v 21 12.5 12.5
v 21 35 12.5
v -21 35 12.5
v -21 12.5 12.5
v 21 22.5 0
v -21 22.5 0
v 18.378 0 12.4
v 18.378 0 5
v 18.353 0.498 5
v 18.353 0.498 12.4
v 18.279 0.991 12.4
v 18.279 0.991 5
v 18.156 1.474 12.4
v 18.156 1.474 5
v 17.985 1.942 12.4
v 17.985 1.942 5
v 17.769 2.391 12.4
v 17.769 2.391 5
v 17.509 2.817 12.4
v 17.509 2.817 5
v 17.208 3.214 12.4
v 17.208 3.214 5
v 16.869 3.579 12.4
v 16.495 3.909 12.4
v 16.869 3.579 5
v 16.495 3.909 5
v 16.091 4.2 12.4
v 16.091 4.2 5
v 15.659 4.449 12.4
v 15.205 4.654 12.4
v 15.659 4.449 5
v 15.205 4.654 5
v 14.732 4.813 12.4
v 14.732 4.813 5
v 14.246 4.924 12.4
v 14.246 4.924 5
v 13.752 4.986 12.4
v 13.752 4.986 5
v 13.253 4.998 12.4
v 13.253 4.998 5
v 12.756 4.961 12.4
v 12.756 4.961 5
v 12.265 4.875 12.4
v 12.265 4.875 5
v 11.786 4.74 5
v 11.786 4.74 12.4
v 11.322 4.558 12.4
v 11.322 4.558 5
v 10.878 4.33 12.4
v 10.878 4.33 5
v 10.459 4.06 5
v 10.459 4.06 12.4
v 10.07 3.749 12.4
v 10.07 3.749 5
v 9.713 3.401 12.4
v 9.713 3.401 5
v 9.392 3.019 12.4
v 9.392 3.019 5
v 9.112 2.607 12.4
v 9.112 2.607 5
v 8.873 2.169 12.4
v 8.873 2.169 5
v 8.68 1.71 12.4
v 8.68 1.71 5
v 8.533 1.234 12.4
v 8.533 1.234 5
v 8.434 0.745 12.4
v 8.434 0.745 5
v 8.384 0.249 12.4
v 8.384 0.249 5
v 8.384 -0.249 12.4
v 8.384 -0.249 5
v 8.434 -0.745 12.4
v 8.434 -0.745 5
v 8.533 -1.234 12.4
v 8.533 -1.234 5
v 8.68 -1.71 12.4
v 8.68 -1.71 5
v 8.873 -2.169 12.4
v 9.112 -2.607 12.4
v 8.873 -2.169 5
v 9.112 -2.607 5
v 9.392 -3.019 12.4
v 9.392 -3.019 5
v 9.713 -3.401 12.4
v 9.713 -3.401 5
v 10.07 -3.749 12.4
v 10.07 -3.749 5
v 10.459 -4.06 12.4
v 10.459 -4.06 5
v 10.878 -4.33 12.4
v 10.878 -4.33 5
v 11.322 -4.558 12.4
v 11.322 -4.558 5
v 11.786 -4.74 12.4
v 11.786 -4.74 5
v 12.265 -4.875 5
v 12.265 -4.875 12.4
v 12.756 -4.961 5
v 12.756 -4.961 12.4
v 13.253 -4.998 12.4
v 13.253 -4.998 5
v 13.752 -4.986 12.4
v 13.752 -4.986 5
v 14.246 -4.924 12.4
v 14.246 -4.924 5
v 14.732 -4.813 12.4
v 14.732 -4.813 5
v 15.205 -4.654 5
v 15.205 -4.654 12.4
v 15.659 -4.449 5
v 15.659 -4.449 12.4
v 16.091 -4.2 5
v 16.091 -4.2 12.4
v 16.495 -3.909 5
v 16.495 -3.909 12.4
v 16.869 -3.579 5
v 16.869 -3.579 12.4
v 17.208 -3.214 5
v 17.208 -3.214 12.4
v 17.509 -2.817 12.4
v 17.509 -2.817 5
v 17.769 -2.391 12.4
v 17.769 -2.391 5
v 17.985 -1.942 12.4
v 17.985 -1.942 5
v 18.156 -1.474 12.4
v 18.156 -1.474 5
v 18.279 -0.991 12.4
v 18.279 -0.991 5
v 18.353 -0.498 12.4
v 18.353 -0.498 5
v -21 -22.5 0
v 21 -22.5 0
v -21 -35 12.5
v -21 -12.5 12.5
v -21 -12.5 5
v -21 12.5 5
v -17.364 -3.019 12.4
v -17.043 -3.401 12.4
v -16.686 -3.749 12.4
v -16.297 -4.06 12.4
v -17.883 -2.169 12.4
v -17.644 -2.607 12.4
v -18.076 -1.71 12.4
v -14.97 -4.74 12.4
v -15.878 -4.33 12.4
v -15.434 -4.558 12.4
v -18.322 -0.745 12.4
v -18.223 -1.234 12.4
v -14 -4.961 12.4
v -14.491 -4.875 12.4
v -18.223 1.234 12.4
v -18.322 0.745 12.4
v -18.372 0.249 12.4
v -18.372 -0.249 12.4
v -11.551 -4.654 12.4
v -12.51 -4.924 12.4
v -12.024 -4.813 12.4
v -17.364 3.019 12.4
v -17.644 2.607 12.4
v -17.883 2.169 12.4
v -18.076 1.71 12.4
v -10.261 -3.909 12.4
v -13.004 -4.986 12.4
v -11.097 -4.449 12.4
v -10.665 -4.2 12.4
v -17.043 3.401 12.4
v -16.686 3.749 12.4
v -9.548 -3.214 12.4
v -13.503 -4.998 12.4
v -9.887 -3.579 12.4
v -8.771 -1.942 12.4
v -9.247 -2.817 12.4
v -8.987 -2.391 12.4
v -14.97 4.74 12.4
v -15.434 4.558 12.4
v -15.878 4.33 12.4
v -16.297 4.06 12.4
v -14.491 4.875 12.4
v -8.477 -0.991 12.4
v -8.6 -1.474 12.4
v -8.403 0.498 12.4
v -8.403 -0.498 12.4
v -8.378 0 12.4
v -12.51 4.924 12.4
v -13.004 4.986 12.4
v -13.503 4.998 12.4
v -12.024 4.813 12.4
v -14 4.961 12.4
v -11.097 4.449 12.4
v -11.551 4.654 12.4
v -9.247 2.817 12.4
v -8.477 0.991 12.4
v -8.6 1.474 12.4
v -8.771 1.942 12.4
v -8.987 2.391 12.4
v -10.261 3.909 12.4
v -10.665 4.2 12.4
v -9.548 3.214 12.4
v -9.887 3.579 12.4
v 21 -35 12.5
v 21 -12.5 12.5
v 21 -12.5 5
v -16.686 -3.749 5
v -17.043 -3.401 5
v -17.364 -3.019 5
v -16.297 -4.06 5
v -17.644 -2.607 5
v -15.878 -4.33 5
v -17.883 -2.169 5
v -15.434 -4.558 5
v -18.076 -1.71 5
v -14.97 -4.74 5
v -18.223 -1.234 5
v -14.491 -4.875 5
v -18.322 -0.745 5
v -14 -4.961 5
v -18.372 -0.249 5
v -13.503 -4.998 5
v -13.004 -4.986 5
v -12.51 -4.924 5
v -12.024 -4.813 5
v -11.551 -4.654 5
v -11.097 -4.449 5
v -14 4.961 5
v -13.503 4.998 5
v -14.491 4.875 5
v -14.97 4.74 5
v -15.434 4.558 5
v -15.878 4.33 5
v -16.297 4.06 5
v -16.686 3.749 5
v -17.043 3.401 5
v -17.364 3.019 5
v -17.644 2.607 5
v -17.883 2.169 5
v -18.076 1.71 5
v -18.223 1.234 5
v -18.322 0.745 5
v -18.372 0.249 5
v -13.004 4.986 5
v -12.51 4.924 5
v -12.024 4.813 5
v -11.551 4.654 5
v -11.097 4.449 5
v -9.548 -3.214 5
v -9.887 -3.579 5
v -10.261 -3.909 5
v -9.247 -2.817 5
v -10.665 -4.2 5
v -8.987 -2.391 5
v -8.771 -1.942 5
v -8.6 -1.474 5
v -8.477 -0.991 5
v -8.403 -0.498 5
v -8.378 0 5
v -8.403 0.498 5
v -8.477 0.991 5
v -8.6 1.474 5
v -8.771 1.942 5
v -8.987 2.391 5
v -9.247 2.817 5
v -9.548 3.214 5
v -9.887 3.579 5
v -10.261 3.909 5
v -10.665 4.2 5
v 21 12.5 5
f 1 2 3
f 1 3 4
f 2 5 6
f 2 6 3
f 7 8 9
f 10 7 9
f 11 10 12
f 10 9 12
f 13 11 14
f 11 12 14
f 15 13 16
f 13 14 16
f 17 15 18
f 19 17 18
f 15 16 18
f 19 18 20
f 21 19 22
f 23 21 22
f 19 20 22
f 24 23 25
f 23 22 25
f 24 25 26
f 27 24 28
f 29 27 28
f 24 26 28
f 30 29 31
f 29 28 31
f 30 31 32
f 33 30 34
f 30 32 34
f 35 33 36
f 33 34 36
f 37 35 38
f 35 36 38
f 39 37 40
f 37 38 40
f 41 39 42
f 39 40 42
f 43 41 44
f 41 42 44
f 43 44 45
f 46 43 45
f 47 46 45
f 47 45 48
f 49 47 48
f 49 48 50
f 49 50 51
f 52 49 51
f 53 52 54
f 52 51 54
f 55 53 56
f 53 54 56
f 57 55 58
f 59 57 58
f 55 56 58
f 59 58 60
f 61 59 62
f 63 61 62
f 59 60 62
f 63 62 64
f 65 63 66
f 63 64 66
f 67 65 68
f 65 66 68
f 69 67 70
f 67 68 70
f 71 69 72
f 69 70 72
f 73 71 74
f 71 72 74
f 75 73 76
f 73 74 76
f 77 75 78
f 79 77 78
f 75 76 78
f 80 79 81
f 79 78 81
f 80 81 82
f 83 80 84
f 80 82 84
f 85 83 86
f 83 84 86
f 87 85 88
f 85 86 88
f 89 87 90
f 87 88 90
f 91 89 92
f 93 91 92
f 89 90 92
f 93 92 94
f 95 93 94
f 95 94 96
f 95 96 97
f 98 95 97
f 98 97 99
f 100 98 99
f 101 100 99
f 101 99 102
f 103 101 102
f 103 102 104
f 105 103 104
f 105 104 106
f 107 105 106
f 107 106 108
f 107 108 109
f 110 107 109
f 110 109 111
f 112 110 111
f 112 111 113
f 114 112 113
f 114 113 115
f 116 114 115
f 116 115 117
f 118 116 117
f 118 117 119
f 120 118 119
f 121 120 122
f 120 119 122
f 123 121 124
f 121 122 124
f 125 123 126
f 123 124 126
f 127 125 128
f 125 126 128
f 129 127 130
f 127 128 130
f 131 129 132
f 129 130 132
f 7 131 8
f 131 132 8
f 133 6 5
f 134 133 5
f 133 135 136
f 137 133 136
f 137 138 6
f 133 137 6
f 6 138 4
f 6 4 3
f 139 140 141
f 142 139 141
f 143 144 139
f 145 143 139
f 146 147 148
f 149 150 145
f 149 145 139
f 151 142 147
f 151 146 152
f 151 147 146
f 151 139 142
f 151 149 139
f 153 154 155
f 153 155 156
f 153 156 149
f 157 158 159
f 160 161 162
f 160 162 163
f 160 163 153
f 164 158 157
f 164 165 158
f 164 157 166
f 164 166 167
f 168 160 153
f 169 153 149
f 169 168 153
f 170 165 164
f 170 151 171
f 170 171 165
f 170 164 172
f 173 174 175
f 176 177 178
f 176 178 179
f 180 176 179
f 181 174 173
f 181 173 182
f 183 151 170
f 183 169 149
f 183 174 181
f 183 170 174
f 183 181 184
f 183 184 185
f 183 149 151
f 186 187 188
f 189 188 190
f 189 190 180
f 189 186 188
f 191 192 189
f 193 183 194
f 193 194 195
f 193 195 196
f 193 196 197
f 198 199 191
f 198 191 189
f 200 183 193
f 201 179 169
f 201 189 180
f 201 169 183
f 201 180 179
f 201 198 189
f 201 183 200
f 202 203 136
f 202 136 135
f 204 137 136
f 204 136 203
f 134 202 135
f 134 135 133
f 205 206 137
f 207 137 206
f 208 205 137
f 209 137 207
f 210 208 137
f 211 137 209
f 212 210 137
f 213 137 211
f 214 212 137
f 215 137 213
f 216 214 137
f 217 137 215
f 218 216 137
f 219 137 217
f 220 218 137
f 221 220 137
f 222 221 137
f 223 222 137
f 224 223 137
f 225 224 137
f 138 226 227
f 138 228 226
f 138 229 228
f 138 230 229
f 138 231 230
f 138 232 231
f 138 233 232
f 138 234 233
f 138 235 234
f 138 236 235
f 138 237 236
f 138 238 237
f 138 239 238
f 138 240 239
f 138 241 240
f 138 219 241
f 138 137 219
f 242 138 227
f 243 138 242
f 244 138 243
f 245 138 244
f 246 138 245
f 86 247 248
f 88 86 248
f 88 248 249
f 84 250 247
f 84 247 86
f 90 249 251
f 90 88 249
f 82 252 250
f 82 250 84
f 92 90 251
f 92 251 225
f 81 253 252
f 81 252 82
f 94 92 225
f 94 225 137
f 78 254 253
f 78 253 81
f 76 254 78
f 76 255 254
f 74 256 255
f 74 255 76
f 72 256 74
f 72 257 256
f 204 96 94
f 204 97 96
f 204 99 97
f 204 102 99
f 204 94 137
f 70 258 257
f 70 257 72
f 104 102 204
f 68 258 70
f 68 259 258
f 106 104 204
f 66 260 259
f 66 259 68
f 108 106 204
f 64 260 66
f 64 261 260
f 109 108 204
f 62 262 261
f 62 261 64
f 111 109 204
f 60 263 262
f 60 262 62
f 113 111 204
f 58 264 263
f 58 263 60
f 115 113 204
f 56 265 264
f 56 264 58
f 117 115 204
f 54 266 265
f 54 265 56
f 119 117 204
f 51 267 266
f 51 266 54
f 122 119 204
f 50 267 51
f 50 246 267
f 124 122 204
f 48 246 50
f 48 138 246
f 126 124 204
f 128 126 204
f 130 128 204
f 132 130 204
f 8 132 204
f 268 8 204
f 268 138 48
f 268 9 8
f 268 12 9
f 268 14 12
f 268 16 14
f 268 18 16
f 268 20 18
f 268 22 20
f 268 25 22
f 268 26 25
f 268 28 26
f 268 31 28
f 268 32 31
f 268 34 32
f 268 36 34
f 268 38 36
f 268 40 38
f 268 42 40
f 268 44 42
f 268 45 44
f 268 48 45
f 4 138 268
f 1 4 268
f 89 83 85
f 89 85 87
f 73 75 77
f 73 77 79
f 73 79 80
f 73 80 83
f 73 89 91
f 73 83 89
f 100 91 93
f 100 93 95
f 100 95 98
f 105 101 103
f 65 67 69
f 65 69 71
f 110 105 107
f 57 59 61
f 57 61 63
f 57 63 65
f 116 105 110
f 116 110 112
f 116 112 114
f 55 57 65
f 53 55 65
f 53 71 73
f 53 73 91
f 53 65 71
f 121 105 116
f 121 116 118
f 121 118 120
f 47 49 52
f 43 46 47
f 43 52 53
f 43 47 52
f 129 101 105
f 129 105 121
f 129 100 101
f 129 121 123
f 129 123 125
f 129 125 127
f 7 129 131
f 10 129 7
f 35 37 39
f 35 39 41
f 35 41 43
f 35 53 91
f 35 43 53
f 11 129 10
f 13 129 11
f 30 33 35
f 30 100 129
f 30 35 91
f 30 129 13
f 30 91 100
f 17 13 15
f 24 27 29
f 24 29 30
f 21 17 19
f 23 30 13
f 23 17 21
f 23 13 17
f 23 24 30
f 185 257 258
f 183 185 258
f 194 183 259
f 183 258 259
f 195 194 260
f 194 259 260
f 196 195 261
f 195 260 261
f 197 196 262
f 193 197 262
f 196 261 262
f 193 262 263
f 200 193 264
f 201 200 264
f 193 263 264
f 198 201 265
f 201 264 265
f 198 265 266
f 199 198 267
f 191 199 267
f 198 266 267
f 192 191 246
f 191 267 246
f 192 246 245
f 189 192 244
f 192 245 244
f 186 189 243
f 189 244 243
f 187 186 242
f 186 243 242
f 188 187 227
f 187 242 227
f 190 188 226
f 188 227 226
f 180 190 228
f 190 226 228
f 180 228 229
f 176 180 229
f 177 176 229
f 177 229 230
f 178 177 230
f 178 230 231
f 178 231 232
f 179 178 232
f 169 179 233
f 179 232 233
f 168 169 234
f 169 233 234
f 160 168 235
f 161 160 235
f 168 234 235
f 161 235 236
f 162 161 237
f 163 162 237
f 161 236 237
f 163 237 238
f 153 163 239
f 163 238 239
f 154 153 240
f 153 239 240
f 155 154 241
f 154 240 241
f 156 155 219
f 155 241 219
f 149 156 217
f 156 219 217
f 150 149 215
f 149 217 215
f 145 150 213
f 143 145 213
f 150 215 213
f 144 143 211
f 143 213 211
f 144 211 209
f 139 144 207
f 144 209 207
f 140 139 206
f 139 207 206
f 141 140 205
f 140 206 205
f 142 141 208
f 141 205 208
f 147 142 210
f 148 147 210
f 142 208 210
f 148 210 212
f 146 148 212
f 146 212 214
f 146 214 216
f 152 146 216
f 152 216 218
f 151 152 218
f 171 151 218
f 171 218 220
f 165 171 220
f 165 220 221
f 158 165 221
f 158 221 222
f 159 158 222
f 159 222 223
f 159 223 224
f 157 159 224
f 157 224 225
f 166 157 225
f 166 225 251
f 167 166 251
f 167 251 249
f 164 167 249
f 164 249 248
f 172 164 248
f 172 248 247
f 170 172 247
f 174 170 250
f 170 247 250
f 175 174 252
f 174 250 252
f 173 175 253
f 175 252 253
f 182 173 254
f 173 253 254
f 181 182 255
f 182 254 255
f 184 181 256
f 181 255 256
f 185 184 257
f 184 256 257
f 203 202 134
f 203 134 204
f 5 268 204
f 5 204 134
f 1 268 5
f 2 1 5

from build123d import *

# Parameters (mm, degrees)
F0_W     = 42
F0_H     = 45
F1_DEPTH = 5
F2_R     = 5
F3_DEPTH = 7.4
F4_W     = 42
F4_H     = 10
F5_DEPTH = 7.5
F7_DEPTH = 42
F9_DEPTH = 42


with BuildPart() as f1:
    # F0 (on Top) → F1 (new body)
    with BuildSketch(Plane.XY):
        Rectangle(F0_W, F0_H)
    extrude(amount=F1_DEPTH)

    # F2 (on face) → F3 (join)
    with BuildSketch(Plane.XY.offset(5)):
        with Locations((-13.378, 0)):
            Circle(F2_R)
        with Locations((13.378, 0)):
            Circle(F2_R)
    extrude(amount=F3_DEPTH)

    # F4 (on face) → F5 (join)
    with BuildSketch(Plane.XY.offset(5)):
        with Locations((0, 17.5)):
            Rectangle(F4_W, F4_H)
        with Locations((0, -17.5)):
            Rectangle(F4_W, F4_H)
    extrude(amount=F5_DEPTH)

    # F6 (on face) → F7 (join)
    with BuildSketch(Plane.YZ.offset(21)):
        Polygon((22.5, 12.5), (22.5, 0), (35, 12.5), align=None)
    extrude(amount=-F7_DEPTH)

    # F8 (on face) → F9 (join)
    with BuildSketch(Plane.YZ.offset(21)):
        Polygon((-35, 12.5), (-22.5, 0), (-22.5, 12.5), align=None)
    extrude(amount=-F9_DEPTH)


solid = f1.part
